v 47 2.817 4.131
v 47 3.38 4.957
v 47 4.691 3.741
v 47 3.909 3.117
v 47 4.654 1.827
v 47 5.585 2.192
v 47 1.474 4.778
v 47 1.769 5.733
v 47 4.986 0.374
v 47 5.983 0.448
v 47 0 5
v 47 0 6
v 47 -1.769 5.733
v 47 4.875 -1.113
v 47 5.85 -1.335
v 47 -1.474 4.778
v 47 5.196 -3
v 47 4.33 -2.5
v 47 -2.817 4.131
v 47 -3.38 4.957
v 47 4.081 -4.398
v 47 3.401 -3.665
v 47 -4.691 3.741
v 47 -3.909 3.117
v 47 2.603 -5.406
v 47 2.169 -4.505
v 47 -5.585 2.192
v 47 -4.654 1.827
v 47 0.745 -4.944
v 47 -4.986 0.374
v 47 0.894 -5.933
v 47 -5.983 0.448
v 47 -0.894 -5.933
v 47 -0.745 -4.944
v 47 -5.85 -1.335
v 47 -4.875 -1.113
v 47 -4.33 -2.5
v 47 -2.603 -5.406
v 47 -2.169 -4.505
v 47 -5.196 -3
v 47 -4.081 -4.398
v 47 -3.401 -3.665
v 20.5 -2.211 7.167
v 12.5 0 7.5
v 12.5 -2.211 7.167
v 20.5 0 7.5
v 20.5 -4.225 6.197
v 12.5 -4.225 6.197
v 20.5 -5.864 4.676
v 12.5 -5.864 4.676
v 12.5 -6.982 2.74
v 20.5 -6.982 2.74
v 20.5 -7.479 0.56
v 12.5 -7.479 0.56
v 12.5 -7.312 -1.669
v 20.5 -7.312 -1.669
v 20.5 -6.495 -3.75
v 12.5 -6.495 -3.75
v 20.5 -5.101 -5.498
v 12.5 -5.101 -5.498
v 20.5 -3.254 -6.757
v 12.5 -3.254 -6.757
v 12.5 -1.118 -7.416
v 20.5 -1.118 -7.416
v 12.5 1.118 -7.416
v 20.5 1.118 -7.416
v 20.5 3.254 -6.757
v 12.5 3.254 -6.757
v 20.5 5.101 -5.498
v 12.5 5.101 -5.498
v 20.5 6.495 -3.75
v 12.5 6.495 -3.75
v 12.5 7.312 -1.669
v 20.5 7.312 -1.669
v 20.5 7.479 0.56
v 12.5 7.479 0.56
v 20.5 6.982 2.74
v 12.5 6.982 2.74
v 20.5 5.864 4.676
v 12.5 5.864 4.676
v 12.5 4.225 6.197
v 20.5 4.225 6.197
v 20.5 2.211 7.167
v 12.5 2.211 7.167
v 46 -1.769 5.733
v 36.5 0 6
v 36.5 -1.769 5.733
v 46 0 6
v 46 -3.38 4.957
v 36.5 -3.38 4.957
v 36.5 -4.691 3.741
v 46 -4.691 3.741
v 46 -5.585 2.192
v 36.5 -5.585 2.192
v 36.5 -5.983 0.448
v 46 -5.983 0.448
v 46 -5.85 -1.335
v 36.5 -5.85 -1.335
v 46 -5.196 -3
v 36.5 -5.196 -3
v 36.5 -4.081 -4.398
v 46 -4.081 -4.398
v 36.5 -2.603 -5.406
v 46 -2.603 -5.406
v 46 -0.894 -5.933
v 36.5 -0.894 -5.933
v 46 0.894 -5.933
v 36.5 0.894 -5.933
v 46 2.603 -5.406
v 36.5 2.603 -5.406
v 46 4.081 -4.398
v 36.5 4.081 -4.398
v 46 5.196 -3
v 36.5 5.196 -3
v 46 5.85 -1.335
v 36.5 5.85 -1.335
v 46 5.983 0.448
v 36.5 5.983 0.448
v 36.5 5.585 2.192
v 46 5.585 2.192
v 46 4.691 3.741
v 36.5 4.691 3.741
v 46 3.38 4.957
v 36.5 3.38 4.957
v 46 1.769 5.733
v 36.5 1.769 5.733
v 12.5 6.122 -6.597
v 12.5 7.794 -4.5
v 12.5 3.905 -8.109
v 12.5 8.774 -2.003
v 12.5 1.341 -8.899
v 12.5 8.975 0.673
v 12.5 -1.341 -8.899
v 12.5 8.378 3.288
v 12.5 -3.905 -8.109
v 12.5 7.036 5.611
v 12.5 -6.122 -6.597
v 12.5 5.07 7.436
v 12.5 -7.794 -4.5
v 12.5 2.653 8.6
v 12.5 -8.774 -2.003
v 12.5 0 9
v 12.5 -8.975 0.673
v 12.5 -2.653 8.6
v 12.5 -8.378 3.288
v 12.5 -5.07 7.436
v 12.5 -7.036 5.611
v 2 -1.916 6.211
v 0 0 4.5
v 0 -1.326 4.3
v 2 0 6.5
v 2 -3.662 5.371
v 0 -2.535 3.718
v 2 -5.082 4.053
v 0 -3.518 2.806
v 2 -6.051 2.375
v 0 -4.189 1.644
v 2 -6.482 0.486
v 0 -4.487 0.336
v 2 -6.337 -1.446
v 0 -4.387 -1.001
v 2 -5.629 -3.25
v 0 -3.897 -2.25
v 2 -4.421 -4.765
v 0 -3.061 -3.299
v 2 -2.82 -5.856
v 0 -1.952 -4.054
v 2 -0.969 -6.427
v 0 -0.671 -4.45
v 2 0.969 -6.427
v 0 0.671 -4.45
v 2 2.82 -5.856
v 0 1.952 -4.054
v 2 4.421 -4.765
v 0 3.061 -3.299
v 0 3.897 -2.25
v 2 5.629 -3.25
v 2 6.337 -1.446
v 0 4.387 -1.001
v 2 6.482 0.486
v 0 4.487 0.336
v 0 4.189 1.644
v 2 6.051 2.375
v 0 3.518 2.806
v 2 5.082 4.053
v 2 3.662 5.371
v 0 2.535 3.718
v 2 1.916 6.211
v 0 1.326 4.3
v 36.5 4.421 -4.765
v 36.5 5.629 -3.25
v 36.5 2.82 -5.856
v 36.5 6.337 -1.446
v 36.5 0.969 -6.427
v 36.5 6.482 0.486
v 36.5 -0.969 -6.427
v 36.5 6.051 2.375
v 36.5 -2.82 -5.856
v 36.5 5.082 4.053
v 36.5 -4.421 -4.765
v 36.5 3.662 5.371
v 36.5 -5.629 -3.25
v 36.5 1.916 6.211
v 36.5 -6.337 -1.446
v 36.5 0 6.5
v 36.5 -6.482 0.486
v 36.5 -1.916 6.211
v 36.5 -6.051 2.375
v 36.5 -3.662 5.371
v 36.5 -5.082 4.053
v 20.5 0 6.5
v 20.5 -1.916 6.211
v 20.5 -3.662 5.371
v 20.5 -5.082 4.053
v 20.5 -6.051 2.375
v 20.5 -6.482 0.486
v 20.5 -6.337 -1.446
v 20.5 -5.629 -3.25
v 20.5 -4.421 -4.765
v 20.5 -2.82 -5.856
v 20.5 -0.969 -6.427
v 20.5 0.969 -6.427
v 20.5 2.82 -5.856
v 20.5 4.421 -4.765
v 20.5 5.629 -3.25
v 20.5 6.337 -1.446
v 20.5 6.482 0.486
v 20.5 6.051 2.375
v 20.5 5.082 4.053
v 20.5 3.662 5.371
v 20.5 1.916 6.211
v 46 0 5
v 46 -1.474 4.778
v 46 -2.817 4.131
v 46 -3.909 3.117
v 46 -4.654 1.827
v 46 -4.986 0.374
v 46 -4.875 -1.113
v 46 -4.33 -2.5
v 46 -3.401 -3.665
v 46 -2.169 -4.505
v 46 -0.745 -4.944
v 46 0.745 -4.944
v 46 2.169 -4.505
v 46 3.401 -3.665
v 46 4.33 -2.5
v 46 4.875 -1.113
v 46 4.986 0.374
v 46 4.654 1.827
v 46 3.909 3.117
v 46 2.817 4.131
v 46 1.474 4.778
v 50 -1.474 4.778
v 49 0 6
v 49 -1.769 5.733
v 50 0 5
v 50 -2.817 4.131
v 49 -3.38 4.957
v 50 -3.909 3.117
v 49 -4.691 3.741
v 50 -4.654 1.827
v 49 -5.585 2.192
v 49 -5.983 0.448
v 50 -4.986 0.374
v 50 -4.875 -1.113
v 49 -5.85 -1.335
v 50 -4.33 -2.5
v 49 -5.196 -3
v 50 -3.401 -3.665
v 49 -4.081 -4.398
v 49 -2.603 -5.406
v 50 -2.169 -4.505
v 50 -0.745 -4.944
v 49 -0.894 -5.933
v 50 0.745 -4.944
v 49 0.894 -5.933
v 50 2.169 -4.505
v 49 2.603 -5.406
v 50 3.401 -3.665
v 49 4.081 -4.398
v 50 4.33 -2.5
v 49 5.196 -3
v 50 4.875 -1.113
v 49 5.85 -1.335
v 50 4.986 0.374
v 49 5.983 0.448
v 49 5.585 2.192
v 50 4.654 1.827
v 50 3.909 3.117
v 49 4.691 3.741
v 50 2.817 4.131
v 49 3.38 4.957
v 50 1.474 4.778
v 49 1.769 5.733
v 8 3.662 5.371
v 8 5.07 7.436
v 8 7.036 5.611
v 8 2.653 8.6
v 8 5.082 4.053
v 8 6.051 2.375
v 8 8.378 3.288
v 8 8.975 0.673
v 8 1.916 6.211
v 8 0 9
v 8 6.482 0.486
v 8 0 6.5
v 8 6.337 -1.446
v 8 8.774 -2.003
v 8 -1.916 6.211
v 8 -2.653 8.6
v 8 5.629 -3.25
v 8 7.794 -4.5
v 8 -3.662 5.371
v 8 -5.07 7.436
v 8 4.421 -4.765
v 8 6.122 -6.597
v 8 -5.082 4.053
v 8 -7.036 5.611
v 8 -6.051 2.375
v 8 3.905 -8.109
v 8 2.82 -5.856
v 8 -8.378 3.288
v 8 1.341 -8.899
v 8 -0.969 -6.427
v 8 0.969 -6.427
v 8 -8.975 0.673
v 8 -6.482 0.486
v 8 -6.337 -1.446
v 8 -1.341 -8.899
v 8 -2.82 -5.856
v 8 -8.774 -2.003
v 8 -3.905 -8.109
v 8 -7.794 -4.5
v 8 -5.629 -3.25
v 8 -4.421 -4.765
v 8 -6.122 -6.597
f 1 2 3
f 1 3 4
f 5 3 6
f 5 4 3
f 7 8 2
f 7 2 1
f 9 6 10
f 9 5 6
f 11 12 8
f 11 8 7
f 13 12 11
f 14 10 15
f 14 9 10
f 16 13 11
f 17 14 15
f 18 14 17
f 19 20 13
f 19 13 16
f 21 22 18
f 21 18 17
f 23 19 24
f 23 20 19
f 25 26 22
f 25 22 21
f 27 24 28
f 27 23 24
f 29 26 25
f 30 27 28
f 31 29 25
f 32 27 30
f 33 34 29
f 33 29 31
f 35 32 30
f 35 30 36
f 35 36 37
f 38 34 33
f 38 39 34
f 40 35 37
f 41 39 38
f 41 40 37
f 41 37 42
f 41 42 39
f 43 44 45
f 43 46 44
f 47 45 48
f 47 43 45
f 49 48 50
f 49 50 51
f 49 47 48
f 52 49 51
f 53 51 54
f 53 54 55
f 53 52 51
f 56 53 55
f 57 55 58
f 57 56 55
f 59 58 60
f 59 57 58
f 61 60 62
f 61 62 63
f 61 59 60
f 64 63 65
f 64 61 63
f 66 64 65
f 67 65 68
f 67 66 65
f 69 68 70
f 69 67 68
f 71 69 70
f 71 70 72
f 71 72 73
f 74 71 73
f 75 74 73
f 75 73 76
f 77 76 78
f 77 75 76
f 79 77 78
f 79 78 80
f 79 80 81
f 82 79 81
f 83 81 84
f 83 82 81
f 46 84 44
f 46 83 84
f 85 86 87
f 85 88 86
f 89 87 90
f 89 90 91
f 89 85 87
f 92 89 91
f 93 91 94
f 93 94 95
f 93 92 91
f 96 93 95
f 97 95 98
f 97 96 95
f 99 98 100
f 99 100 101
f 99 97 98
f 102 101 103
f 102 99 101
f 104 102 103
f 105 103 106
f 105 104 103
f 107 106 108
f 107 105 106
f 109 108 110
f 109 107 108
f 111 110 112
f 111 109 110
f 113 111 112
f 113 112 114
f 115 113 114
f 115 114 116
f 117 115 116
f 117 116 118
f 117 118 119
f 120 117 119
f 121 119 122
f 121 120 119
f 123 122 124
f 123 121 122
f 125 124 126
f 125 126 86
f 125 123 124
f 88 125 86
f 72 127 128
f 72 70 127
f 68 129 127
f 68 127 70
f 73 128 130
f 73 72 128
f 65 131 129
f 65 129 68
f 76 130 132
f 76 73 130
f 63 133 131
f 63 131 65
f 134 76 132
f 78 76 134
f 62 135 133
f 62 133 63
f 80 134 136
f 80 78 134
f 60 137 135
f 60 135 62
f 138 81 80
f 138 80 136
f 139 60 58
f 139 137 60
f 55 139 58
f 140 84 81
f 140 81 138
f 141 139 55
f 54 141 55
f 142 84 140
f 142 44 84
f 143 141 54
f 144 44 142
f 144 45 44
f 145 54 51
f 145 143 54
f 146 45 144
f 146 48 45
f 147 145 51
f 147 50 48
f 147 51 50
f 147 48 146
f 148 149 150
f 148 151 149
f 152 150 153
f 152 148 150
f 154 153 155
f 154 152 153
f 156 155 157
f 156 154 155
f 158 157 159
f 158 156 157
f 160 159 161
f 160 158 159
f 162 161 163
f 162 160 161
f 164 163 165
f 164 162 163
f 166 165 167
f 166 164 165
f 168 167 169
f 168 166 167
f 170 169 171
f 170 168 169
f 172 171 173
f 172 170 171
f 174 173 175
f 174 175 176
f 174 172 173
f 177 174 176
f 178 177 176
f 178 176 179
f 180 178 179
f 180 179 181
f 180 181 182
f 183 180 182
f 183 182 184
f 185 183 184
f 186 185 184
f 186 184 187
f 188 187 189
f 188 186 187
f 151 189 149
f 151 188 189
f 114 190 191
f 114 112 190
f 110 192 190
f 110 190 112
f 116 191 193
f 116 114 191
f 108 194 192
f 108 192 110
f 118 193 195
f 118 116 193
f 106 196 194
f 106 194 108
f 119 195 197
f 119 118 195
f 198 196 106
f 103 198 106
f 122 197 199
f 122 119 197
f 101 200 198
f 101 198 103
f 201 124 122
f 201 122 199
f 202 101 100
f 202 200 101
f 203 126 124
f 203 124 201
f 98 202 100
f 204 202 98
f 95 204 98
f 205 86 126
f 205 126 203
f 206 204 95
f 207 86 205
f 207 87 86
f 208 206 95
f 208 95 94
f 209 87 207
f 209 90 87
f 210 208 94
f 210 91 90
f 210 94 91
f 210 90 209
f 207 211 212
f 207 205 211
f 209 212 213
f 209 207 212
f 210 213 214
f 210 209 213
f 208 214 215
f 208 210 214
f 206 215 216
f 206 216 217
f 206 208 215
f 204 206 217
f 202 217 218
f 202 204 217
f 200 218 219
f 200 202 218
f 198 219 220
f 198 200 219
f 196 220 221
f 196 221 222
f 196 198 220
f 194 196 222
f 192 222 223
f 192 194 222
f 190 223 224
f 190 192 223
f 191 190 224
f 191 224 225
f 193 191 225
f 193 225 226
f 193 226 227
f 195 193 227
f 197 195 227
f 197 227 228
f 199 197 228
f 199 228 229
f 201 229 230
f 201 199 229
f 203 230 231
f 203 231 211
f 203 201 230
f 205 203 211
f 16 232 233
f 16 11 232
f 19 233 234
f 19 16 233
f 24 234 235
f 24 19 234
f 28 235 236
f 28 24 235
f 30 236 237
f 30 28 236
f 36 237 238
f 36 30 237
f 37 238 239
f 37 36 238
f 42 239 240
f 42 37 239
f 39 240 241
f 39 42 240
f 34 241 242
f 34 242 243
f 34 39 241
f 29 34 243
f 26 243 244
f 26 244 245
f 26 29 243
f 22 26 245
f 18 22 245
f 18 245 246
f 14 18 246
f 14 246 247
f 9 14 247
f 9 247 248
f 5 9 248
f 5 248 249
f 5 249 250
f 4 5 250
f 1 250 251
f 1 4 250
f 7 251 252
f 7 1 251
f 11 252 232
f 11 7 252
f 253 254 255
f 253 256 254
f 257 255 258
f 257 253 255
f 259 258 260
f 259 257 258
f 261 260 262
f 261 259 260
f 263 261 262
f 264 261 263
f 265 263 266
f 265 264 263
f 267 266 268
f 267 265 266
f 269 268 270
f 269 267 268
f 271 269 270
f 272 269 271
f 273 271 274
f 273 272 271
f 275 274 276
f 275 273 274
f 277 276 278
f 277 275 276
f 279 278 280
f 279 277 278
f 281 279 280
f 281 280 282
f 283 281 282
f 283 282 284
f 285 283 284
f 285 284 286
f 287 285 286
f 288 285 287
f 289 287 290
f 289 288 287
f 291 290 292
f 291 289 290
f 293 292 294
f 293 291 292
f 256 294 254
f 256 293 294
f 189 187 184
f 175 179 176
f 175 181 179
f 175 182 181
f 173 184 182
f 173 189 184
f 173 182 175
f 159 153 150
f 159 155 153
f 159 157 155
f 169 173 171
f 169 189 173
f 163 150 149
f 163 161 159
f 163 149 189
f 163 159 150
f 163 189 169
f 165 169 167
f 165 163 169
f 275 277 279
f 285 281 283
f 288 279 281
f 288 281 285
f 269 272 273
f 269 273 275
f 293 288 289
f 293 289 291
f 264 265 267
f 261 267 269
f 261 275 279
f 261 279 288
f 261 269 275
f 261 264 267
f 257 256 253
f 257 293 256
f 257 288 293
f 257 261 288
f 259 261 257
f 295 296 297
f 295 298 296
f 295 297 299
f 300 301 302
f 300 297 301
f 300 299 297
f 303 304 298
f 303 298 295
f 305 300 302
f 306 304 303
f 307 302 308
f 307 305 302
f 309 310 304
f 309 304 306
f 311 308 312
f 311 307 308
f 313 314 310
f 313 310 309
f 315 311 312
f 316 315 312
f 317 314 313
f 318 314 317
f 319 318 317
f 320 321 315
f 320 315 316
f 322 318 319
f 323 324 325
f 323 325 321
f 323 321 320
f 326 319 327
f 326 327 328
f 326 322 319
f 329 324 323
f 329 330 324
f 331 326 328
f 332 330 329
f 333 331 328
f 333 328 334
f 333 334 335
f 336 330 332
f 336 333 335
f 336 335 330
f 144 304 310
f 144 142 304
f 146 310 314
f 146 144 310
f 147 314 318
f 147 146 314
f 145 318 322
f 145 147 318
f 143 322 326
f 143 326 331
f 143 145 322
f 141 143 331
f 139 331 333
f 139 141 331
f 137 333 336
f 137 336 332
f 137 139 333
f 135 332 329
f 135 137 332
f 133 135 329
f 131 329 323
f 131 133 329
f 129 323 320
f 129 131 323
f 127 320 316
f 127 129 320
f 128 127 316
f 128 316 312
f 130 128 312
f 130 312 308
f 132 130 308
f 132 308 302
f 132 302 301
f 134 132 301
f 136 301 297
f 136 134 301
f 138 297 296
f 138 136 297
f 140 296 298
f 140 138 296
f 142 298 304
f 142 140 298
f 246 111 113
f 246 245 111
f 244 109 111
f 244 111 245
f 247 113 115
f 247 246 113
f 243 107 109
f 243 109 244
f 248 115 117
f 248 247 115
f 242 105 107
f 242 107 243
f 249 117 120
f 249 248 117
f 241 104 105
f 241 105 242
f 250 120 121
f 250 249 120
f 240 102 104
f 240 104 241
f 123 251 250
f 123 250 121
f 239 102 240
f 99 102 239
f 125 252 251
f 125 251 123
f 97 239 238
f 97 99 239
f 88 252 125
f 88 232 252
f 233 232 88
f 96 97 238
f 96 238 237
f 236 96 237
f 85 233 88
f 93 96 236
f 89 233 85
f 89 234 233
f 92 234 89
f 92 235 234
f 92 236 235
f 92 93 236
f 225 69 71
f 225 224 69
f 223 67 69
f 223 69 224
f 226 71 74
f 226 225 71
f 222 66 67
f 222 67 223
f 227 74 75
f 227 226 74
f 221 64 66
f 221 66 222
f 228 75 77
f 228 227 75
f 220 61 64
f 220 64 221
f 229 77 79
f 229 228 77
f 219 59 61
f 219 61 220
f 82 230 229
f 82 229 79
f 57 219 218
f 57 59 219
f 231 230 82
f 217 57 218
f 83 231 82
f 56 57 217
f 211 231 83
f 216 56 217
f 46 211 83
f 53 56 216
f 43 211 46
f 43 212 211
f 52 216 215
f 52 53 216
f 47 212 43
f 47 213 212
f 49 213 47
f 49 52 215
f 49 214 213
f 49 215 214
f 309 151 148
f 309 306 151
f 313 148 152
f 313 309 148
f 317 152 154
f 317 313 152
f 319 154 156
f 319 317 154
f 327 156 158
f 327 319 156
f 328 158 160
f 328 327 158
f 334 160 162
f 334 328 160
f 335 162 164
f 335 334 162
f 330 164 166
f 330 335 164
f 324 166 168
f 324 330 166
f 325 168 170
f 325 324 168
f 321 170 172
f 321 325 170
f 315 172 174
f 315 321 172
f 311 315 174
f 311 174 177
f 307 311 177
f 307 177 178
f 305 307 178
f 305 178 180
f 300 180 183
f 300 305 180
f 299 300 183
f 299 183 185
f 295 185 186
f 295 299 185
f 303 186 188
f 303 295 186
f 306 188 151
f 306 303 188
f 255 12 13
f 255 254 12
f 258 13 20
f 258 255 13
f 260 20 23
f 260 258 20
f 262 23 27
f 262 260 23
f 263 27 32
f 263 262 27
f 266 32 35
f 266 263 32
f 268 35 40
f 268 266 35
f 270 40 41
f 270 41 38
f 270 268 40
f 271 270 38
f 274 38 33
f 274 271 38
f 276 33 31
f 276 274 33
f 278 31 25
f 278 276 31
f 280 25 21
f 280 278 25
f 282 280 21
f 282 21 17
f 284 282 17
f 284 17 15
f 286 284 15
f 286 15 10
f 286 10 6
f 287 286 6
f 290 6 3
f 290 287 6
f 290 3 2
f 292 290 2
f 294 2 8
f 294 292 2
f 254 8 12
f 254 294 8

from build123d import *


with BuildPart() as part:
    # Esquisse1 → Base-Révolution (revolve)
    with BuildSketch(Plane.XY, mode=Mode.PRIVATE) as base_r_volution_sk:
        Polygon((0, 0), (0, 4.5), (2, 6.5), (8, 6.5), (8, 9), (12.5, 9), (12.5, 7.5), (20.5, 7.5), (20.5, 6.5), (36.5, 6.5), (36.5, 6), (46, 6), (46, 5), (47, 5), (47, 6), (49, 6), (50, 5), (50, 0), align=None)
    revolve(base_r_volution_sk.sketch.rotate(Axis((0, 0, 0), (1, 0, 0)), 90), axis=Axis((0, 0, 0), (1, 0, 0)))


solid = part.part
